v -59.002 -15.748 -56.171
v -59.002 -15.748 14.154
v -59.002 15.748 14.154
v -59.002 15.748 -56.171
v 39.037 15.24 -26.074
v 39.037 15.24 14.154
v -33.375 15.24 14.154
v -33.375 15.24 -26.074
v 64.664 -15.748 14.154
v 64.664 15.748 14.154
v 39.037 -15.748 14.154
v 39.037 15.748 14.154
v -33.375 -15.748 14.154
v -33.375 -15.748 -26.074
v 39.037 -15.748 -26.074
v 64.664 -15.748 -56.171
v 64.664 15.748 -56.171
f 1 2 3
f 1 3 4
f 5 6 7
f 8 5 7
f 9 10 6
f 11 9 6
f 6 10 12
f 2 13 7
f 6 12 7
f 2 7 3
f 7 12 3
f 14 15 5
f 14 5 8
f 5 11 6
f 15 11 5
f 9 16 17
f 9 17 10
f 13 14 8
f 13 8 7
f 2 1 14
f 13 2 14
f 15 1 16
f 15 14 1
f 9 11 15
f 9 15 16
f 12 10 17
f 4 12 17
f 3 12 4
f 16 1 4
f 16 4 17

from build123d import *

# Parameters (mm, degrees)
F1_DEPTH = 15.748
F2_W     = 72.411287576
F2_H     = 40.2284925804
F3_DEPTH = 0.508


with BuildPart() as f1:
    # F0 (on Front) → F1 (new body, symmetric)
    with BuildSketch(Plane.XZ):
        Polygon((-33.3747491241, 14.154468663), (-59.001788497, 14.154468663), (-59.001788497, -56.1708956957), (64.6635815501, -56.1708956957), (64.6635815501, 14.154468663), (39.0365384519, 14.154468663), (39.0365384519, -26.0740239173), (-33.3747491241, -26.0740239173), align=None)
    extrude(amount=F1_DEPTH, both=True)

    # F2 (on face) → F3 (join)
    with BuildSketch(Plane(origin=(0, 15.748, 0), x_dir=(-1, 0, 0), z_dir=(0, 1, 0))):
        with Locations((-2.8308946639, -5.9597776271)):
            Rectangle(F2_W, F2_H)
    extrude(amount=-F3_DEPTH)


solid = f1.part
